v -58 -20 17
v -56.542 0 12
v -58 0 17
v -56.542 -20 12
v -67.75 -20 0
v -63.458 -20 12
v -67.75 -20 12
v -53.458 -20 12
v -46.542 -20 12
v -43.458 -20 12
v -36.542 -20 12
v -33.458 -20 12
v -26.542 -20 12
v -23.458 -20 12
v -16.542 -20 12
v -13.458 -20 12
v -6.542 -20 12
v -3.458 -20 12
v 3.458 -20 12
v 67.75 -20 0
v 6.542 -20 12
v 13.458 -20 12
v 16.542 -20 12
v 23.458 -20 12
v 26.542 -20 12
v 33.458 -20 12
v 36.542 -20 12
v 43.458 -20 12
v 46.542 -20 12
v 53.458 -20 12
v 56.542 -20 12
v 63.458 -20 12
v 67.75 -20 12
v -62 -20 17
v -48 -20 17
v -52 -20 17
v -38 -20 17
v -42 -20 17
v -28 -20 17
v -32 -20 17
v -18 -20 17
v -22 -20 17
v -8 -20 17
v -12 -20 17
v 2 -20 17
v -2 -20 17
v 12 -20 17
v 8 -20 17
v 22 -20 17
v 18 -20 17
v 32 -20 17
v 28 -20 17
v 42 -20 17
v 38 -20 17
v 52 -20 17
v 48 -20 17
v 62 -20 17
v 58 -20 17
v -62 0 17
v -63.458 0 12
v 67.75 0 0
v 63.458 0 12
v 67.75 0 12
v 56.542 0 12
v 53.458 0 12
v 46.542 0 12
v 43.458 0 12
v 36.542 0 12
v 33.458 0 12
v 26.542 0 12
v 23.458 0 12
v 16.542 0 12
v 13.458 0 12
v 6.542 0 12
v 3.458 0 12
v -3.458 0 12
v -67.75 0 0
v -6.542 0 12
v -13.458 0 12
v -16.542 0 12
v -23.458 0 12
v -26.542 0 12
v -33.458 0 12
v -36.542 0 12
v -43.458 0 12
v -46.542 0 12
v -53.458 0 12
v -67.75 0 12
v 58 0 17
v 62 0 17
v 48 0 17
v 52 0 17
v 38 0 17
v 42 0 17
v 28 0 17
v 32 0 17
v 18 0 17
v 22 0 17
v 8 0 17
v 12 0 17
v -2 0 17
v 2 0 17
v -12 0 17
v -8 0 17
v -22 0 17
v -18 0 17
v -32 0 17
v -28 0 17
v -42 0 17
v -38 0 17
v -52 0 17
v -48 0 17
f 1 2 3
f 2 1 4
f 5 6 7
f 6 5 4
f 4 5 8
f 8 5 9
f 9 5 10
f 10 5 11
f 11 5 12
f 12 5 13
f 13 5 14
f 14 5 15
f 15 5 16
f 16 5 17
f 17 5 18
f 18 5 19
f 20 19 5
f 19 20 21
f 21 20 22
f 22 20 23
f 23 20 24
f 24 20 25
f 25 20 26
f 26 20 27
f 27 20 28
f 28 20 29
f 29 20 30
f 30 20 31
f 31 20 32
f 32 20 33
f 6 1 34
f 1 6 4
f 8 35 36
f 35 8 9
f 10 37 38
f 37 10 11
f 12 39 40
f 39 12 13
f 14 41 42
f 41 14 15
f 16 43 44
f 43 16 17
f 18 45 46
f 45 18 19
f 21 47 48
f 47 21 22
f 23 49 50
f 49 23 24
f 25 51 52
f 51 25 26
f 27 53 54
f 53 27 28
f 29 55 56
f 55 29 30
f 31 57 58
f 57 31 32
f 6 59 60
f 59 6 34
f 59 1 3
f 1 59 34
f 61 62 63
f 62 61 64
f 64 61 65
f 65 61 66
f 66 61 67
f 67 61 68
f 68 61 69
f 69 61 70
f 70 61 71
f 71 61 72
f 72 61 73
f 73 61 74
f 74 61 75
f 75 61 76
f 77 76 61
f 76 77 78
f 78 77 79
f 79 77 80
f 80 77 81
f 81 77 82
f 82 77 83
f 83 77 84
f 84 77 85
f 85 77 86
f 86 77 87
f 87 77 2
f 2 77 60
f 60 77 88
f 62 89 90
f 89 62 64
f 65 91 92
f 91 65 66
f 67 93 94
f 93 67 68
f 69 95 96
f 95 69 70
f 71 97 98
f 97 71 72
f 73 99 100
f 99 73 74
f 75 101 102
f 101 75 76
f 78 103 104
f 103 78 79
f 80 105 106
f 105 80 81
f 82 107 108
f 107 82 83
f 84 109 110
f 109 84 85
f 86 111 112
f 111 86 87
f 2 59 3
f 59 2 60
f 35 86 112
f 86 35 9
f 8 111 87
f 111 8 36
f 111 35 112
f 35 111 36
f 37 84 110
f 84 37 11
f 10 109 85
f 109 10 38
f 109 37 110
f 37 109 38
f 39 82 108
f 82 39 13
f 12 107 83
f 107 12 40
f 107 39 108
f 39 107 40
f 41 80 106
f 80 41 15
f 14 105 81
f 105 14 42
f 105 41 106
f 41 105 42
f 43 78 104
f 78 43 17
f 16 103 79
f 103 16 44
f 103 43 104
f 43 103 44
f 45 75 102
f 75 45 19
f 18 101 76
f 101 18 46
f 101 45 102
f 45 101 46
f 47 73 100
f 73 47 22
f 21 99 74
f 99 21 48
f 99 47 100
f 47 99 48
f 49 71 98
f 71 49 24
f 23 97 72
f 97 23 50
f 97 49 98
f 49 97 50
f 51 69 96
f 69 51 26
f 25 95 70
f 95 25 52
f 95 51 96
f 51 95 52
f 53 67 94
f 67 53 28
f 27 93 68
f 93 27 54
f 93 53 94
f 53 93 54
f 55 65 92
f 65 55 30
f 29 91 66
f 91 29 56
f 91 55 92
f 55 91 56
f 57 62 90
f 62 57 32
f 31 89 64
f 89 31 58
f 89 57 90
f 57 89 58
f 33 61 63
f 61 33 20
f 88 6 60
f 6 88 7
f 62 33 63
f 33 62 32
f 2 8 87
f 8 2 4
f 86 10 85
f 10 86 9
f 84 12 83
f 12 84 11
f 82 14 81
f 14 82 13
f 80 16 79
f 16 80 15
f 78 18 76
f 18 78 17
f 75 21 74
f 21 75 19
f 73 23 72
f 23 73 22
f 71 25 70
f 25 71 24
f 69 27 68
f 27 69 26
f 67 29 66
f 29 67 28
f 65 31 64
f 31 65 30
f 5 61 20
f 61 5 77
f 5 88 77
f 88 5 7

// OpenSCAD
$fn = 32;

// ----------------------------------------------------------------------
// Toothed rack, 13 teeth
// 10 mm pitch, 5 mm teeth
// ----------------------------------------------------------------------

// --- parameters (mm) ---
bar_w = 20;    // bar width (Y)
bar_h = 12;    // bar height (Z)
teeth = 13;    // number of teeth
pitch = 10;    // tooth pitch
tooth_h = 5;   // tooth height above the bar
root_w = 7.5;  // tooth width at the root
crest_w = 4;   // tooth width at the crest

// --- derived feature positions (mm) ---
span = (teeth - 1) * pitch;  // = 120   distance between the outer teeth
bar_l = span + root_w + 8;   // = 135.5   bar length: teeth plus 4 mm at each end
tooth_x = -span / 2;         // = -60   X of the first tooth
height = bar_h + tooth_h;    // = 17   overall height
feature_centers = [
  [tooth_x + 0 * pitch, -bar_w / 2],
  [tooth_x + 1 * pitch, -bar_w / 2],
  [tooth_x + 2 * pitch, -bar_w / 2],
  [tooth_x + 3 * pitch, -bar_w / 2],
  [tooth_x + 4 * pitch, -bar_w / 2],
  [tooth_x + 5 * pitch, -bar_w / 2],
  [tooth_x + 6 * pitch, -bar_w / 2],
  [tooth_x + 7 * pitch, -bar_w / 2],
  [tooth_x + 8 * pitch, -bar_w / 2],
  [tooth_x + 9 * pitch, -bar_w / 2],
  [tooth_x + 10 * pitch, -bar_w / 2],
  [tooth_x + 11 * pitch, -bar_w / 2],
  [tooth_x + 12 * pitch, -bar_w / 2]
];   // tooth centre line, drives the tooth loop

// bar with a rack of teeth, one extruded trapezoium per centre
module rack_tooth() {
  linear_extrude(height = bar_w)
    polygon(points = [
      [0, 0],
      [root_w, 0],
      [root_w / 2 + crest_w / 2, tooth_h + 1],
      [root_w / 2 - crest_w / 2, tooth_h + 1]
    ]);
}

union() {
  translate([-bar_l / 2, -bar_w, 0]) cube([bar_l, bar_w, bar_h]);
  for (centre = feature_centers)
    translate([centre[0] - root_w / 2, 0, bar_h - 1]) rotate([90, 0, 0]) rack_tooth();
}
